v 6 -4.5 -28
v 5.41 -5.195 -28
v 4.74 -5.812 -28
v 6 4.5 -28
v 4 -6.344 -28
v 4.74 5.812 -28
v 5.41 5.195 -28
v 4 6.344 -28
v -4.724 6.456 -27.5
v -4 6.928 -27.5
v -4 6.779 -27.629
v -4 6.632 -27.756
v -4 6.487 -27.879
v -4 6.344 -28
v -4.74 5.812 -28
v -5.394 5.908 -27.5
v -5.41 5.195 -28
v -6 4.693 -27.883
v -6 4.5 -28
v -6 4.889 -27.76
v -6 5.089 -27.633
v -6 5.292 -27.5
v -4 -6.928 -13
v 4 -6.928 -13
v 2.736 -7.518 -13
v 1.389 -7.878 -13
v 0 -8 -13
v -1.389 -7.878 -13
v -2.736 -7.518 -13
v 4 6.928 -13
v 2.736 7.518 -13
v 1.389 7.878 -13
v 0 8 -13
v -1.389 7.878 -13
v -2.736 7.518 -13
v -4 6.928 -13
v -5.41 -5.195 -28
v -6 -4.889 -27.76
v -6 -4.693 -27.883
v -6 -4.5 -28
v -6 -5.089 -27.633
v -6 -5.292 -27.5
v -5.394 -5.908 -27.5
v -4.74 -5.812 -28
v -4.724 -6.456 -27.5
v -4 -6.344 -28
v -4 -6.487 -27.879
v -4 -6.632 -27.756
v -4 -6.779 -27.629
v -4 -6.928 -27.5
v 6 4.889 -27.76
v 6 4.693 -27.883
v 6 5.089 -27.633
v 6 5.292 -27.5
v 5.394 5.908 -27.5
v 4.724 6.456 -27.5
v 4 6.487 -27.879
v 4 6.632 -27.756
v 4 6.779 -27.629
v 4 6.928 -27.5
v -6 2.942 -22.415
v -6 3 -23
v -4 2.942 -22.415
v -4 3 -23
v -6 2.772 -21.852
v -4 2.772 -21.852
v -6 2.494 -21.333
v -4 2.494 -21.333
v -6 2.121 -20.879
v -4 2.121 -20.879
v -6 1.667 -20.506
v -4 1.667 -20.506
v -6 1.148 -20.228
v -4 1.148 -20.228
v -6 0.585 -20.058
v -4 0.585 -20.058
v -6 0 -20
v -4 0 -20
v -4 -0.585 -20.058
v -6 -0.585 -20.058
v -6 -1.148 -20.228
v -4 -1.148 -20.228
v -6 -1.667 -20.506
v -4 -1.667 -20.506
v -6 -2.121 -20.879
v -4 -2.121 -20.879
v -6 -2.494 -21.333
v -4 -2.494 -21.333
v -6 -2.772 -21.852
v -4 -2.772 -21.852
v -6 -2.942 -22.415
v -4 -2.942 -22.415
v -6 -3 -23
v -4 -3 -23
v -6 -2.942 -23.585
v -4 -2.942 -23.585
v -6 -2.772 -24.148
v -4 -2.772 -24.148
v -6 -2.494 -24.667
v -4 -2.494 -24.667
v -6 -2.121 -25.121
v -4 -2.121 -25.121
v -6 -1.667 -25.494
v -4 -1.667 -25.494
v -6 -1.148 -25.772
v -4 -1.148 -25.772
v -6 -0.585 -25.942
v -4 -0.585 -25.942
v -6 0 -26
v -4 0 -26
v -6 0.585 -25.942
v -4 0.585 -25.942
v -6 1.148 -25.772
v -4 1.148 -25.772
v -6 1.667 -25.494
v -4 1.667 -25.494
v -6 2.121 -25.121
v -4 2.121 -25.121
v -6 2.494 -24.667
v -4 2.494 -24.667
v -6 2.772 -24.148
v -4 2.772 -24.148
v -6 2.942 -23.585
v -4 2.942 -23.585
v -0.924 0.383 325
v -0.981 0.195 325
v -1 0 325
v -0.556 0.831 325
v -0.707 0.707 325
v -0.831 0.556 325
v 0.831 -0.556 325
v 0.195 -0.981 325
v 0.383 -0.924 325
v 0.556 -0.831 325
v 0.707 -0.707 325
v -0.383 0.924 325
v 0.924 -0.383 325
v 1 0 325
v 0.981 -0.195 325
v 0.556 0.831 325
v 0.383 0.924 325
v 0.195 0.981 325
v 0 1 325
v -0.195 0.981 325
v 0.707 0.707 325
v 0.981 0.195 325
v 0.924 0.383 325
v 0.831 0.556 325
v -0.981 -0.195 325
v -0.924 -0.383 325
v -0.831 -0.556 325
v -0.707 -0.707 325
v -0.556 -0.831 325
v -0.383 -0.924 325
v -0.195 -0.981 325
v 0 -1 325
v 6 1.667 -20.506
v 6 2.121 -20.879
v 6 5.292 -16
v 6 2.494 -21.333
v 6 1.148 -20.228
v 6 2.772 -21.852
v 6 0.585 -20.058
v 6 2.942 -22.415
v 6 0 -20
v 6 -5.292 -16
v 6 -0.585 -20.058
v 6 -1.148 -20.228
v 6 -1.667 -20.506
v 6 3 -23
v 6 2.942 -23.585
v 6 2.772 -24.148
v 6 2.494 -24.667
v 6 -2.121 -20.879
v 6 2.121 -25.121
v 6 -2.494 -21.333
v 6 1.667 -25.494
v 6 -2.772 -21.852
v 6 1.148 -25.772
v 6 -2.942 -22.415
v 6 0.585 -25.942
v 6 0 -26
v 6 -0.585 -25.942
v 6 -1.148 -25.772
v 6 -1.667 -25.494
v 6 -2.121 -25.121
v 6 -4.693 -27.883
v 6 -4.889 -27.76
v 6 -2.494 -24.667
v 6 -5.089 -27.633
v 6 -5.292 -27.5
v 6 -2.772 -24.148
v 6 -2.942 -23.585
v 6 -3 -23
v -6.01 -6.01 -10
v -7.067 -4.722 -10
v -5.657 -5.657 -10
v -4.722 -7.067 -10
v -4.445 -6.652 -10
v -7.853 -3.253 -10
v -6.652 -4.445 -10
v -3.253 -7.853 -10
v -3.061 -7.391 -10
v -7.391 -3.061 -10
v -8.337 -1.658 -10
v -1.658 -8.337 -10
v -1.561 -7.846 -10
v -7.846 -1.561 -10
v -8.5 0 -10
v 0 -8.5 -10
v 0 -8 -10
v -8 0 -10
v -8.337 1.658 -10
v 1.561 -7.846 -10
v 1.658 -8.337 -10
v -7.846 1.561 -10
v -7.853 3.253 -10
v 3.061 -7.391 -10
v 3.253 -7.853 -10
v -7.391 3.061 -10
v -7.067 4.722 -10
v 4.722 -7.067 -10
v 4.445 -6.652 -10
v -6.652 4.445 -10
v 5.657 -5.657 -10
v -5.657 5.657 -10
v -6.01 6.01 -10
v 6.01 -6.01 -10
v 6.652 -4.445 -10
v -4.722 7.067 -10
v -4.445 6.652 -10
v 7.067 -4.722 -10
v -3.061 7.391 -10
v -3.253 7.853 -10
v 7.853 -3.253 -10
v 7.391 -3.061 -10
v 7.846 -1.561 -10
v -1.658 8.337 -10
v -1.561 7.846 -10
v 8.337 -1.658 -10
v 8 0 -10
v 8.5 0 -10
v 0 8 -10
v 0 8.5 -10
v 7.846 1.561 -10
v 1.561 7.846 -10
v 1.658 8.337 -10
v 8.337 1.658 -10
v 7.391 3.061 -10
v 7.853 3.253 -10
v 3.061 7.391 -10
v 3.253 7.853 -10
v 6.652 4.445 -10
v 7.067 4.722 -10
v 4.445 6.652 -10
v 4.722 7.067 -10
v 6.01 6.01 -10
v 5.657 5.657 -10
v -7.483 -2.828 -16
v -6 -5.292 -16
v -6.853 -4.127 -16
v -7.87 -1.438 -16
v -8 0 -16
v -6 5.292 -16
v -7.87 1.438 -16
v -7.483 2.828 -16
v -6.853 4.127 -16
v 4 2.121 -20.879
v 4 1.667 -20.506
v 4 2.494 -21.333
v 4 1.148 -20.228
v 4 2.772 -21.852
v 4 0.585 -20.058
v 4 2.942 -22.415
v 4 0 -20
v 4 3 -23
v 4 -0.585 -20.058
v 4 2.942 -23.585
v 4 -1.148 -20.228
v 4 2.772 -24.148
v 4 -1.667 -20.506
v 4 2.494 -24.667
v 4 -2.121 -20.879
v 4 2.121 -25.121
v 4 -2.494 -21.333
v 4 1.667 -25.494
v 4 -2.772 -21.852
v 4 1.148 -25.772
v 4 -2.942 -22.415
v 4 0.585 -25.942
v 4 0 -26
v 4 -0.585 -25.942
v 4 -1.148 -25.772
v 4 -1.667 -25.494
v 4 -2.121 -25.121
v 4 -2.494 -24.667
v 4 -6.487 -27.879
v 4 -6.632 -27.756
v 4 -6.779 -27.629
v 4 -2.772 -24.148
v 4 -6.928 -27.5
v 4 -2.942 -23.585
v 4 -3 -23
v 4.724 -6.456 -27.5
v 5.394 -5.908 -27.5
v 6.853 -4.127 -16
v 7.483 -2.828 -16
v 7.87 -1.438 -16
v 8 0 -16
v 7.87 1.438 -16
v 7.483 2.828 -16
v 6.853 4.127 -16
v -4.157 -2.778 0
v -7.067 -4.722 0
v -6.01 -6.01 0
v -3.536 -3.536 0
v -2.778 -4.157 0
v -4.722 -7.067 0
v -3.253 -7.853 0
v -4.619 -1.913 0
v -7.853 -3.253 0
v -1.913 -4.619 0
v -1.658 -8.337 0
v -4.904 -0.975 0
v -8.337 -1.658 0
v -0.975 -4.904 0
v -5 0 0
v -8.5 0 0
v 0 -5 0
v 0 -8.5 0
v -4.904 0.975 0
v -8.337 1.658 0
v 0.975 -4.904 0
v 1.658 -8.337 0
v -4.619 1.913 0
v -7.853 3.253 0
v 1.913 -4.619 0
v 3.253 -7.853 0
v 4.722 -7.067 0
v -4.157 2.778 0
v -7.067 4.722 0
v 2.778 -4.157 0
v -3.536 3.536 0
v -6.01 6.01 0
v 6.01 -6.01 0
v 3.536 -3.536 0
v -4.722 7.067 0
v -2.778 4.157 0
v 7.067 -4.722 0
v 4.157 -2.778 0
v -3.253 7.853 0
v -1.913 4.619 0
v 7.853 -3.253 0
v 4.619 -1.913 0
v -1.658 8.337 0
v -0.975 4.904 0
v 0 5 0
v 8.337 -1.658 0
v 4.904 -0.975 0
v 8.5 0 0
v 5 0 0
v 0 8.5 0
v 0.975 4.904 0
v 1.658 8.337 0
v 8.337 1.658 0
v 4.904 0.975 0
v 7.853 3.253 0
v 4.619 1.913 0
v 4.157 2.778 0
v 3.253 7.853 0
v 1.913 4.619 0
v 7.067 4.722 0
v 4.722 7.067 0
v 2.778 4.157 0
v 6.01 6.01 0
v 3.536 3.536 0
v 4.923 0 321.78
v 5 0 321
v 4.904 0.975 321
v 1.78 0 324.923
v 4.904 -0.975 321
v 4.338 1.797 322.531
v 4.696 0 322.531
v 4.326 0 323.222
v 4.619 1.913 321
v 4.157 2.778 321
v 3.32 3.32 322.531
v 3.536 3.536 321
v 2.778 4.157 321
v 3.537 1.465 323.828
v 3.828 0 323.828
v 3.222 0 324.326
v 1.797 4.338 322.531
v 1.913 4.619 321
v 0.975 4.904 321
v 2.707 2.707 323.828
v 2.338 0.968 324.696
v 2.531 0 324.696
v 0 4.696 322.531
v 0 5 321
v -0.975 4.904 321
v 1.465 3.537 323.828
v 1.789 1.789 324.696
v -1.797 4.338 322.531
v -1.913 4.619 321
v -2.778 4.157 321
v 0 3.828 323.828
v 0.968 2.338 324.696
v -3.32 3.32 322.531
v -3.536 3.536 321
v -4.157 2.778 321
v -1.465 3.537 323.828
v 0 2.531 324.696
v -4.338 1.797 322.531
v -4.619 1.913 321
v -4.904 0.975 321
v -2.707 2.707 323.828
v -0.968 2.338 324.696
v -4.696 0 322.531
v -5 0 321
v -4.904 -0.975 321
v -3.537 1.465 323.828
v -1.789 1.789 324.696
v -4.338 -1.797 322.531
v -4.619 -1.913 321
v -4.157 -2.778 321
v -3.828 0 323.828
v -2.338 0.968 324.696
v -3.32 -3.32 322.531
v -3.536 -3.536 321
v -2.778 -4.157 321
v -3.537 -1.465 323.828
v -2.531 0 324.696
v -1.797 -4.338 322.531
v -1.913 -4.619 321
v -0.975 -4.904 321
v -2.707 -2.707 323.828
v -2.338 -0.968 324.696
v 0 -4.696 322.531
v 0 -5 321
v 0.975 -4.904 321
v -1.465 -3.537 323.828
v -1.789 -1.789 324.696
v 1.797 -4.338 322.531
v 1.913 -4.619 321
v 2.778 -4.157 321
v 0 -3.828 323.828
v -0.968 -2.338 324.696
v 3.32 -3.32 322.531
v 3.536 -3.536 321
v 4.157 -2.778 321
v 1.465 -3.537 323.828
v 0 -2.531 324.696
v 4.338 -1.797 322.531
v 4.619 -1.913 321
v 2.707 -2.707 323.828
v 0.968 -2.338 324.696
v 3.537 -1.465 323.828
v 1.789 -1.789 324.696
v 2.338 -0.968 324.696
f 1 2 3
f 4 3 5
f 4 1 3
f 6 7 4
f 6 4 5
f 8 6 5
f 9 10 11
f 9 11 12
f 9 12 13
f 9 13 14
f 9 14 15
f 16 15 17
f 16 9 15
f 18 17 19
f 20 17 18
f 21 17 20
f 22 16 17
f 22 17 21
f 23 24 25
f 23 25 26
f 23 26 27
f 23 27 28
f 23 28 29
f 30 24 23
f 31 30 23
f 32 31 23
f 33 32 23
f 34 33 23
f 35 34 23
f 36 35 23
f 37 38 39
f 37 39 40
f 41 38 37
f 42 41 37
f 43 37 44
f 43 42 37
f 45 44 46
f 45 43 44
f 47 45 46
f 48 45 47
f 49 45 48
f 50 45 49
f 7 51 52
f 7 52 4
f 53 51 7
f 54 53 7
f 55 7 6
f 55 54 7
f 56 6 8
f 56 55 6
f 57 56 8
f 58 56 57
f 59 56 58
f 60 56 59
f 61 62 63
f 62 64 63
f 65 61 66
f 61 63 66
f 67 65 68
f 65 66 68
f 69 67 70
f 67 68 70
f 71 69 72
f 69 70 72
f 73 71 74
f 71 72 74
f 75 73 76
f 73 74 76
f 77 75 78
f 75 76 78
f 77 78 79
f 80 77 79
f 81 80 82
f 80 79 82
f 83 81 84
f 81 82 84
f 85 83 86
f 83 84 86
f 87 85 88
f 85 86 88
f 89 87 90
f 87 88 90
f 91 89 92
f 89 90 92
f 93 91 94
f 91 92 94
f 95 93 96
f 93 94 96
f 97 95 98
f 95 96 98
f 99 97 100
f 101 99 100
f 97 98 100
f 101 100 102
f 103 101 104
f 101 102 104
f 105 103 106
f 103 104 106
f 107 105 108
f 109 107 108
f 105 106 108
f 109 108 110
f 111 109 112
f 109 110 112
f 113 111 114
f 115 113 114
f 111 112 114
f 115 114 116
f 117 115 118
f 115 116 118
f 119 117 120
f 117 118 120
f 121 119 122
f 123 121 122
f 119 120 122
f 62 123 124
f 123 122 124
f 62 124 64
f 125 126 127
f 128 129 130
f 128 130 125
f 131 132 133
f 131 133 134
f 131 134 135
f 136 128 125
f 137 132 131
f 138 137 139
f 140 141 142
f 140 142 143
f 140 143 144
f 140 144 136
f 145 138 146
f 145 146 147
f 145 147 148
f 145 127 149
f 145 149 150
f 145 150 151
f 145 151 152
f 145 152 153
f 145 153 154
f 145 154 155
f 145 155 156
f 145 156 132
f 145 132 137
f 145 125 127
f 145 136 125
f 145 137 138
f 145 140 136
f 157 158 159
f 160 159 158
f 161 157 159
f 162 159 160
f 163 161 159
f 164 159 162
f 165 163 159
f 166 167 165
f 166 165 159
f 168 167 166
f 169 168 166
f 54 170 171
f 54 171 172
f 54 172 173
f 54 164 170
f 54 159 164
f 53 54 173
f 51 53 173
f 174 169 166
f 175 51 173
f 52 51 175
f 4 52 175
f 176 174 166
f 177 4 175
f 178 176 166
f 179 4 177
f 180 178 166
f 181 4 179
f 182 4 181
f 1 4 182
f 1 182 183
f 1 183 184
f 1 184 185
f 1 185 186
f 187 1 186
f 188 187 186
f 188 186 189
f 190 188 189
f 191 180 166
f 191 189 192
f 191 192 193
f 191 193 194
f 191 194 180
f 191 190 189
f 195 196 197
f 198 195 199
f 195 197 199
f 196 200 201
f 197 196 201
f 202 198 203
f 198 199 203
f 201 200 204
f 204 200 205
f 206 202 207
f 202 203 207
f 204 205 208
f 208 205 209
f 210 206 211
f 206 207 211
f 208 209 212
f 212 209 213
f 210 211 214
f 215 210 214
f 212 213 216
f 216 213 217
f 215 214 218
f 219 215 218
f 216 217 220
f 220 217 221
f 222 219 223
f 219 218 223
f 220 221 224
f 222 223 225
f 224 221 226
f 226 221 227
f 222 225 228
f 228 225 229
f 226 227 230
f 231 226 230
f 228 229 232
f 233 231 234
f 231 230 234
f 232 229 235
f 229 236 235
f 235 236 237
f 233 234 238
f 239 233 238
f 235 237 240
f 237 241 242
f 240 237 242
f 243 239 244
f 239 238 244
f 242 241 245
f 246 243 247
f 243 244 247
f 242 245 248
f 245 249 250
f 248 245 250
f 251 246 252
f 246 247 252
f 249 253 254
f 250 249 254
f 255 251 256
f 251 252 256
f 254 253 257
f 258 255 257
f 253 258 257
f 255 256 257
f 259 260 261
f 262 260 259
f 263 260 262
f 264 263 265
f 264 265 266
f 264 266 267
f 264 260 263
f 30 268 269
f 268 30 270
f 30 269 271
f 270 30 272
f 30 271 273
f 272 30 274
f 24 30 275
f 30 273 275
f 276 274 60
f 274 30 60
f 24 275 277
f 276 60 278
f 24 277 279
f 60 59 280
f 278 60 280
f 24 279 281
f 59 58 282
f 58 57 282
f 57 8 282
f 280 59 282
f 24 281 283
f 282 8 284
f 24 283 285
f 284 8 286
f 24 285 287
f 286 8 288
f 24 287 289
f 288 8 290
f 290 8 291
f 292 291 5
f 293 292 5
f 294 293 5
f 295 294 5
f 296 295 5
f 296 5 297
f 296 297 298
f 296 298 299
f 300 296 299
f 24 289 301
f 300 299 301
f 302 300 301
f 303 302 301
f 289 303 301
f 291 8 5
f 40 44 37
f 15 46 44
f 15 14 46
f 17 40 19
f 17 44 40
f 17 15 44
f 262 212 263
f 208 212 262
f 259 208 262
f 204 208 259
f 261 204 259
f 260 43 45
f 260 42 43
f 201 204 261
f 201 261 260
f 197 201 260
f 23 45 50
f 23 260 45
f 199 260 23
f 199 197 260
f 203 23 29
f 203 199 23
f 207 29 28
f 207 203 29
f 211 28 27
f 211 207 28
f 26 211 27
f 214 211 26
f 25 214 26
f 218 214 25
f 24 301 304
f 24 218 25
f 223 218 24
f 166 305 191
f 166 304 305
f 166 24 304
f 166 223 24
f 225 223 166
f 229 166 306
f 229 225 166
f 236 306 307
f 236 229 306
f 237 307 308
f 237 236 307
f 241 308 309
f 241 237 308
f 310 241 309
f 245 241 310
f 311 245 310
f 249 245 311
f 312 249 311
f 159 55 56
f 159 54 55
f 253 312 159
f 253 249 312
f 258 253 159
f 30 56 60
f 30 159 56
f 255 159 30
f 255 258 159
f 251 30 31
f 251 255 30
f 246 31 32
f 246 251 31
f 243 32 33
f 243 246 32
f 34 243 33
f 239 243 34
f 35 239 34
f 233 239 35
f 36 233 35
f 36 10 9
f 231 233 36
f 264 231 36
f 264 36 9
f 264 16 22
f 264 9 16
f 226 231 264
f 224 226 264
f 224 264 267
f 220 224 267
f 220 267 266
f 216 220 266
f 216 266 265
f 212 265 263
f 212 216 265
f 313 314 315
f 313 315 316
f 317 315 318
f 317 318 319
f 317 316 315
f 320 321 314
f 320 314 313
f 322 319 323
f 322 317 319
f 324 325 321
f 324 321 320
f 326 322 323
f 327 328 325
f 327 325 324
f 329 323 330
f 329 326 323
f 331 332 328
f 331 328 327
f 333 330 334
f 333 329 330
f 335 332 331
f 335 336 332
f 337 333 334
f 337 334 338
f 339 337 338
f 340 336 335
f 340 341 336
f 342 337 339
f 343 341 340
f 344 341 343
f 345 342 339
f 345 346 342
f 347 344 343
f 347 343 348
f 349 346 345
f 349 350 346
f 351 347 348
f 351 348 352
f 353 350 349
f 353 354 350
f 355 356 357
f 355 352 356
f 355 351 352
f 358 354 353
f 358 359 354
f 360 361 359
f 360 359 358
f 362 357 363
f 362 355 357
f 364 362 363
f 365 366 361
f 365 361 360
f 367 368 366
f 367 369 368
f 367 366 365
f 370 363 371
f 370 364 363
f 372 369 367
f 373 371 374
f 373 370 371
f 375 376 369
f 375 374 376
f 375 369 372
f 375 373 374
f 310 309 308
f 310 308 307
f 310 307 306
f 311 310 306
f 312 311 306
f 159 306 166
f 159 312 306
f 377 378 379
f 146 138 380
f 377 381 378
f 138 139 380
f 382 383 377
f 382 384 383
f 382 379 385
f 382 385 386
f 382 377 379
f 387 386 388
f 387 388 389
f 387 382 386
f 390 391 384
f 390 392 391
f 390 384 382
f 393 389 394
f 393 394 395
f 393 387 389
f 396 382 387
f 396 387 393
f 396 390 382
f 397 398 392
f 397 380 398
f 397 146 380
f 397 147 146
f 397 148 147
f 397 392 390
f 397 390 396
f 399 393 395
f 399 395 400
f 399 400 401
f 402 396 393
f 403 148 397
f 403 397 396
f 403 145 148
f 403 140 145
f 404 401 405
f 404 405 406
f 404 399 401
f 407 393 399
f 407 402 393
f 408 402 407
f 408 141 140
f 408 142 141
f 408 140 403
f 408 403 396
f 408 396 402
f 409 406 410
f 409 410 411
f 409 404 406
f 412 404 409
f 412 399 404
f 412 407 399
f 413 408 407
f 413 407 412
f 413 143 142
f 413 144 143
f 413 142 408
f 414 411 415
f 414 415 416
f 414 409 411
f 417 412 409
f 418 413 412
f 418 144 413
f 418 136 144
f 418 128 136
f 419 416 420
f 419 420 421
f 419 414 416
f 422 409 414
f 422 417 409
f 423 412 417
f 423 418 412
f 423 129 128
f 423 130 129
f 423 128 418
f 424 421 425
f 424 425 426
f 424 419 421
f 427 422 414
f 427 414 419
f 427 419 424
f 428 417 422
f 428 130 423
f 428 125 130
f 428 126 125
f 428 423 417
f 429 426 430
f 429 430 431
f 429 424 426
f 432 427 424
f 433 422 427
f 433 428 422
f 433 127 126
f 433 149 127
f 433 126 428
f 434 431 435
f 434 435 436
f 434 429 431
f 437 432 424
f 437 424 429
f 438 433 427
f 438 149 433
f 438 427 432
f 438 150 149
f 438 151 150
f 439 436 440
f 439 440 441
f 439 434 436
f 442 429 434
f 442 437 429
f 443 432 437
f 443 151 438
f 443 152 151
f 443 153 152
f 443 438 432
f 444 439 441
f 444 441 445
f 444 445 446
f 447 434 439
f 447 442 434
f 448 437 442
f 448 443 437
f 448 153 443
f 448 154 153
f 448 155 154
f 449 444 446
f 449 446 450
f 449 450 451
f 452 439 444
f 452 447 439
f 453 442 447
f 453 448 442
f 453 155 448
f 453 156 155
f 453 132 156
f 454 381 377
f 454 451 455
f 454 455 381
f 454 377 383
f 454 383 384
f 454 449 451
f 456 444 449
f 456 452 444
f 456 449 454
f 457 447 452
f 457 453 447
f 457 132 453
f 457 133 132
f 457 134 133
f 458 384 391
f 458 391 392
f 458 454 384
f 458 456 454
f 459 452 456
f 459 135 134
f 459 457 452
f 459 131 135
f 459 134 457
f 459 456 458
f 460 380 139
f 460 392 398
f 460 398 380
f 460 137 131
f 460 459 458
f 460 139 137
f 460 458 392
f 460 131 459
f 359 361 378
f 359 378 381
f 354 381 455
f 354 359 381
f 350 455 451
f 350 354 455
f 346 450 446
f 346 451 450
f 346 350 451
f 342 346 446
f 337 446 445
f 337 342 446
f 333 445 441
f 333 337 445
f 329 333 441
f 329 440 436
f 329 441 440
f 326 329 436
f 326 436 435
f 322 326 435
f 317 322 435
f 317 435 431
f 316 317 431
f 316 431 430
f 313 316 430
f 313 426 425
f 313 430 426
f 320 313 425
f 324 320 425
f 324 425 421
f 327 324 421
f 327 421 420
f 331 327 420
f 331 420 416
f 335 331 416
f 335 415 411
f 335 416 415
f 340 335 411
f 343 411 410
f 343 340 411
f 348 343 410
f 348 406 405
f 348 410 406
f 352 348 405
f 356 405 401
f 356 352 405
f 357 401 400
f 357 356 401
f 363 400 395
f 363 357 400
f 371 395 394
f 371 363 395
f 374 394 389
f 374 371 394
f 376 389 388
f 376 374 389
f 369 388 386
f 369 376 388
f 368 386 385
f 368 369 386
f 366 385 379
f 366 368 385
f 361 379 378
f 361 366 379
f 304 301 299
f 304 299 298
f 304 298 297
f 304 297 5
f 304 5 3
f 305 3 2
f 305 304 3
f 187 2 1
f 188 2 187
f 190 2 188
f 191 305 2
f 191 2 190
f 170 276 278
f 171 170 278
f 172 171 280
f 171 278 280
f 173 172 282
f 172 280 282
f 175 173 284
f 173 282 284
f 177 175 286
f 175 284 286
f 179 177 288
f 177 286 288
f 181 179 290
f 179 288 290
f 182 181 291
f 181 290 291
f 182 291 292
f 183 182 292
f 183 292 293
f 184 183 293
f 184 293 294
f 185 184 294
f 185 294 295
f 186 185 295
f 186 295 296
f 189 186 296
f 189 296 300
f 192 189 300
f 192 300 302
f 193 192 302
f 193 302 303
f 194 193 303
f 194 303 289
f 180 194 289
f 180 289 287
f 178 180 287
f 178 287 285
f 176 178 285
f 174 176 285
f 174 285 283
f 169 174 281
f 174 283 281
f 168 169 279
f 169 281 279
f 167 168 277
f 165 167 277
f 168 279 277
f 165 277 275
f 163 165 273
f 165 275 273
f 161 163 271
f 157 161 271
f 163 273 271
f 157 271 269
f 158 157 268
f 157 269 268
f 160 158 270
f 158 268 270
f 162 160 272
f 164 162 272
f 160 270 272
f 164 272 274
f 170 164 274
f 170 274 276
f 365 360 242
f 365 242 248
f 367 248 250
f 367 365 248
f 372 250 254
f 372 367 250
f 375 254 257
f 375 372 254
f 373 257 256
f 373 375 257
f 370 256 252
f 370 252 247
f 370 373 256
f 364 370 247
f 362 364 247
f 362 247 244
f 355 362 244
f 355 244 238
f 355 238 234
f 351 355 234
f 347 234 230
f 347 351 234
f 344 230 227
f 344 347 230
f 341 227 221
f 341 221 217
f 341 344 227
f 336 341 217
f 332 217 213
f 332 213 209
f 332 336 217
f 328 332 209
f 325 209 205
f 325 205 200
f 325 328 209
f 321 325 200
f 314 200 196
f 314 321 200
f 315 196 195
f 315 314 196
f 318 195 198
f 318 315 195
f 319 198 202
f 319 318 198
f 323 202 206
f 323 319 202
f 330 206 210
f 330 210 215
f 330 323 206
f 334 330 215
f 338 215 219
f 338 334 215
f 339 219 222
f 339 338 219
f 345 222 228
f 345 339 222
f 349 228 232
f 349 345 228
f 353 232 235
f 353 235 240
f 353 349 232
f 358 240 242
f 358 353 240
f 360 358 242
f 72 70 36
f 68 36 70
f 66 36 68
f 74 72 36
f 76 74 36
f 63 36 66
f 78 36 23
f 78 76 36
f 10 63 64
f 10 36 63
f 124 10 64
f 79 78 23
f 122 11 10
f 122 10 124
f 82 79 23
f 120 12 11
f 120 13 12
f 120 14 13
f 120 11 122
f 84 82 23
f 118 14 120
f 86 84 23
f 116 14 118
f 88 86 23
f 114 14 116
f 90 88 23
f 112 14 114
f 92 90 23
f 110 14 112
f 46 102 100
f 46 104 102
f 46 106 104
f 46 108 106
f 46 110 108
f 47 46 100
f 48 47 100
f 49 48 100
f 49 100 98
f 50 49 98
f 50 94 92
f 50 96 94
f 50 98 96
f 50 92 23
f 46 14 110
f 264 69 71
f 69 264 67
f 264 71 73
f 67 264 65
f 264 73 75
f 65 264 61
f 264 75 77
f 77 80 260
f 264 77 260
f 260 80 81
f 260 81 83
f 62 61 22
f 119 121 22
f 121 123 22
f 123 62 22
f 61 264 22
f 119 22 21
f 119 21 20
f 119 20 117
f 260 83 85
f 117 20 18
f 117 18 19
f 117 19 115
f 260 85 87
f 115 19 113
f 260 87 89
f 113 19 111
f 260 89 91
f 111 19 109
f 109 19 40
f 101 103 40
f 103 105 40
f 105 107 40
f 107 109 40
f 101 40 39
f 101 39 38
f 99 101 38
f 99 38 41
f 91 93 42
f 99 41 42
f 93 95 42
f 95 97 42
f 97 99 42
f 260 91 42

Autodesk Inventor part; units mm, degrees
ref_plane "YZ Plane" through (0, 0, 0) normal (1, 0, 0) x (0, 1, 0)
ref_plane "XZ Plane" through (0, 0, 0) normal (0, 1, 0) x (-1, 0, 0)
ref_plane "XY Plane" through (0, 0, 0) normal (0, 0, 1) x (1, 0, 0)
sketch "Esboço1" plane through (0, 0, 0) normal (0, 0, 1) x (1, 0, 0)
  circle A0 centre (0, 0) radius 8.5
  dimension "d0" = 17
extrude "Extrusão1" add sketch "Esboço1" against normal blind 10
sketch "Esboço2" plane through (0, 0, 0) normal (0, 0, 1) x (1, 0, 0)
  circle A0 centre (0, 0) radius 8.5 projected
  circle A1 centre (0, 0) radius 5
  dimension "d3" = 10
extrude "Extrusão2" add sketch "Esboço2" along normal blind 325 contours A1
sketch "Esboço3" plane through (0, 0, -10) normal (0, 0, -1) x (-1, 0, 0)
  circle A0 centre (0, 0) radius 8.5 projected
  circle A1 centre (0, 0) radius 8
  dimension "d6" = 16
extrude "Extrusão3" add sketch "Esboço3" along normal blind 18 contours A1
sketch "Esboço4" plane through (0, 0, -28) normal (0, 0, -1) x (-1, 0, 0)
  circle A0 centre (0, 0) radius 8 projected
  circle A1 centre (0, 0) radius 8 projected
  line L0 (-4, 6.9282) -> (-4, -6.9282)
  line L1 (4, 6.9282) -> (4, -6.9282)
  arc A2 (-4, -6.9282) -> (4, -6.9282) centre (0, 0) ccw
  arc A3 (4, 6.9282) -> (-4, 6.9282) centre (0, 0) ccw
  point P0 (-4, -6.9282)
  dimension "d9" = 4
  dimension "d10" = 4
extrude "Extrusão4" cut sketch "Esboço4" against normal blind 15 contours L1 A0 L0
sketch "Esboço6" plane through (0, 0, -28) normal (0, 0, -1) x (-1, 0, 0)
  line L0 (-4, -6.9282) -> (-4, 6.9282) projected
  arc A0 (-4, 6.9282) -> (-4, -6.9282) centre (0, 0) ccw projected
  circle A1 centre (0, 0) radius 8 projected
  line L1 (-6, 5.2915) -> (-6, -5.2915)
  line L2 (6, 5.2915) -> (6, -5.2915)
  arc A2 (-6, 5.2915) -> (-6, -5.2915) centre (0, 0) ccw
  arc A3 (6, -5.2915) -> (6, 5.2915) centre (0, 0) ccw
  point P0 (6, -5.2915)
  dimension "d15" = 6
  dimension "d16" = 6
extrude "Extrusão5" cut sketch "Esboço6" against normal blind 12 contours A0 L1 | L2 A1
sketch "Esboço7" plane through (0, 0, 0) normal (1, 0, 0) x (0, 1, 0)
  circle A0 centre (0, -23) radius 3
  line L0 (-6.9282, -28) -> (6.9282, -28) projected
  point P0 (0, 0)
  dimension "d19" = 5
  dimension "d20" = 6
extrude "Extrusão6" cut sketch "Esboço7" along normal through all both and the other way through all
chamfer "Chanfro1" distance 0.5 angle 45 4 edges at (-5.0665, -6.1911, -28) (-5.0665, 6.1911, -28) (5.0665, -6.1911, -28) (5.0665, 6.1911, -28)
fillet "Arredondamento1" radius 4 1 edges at (-5, 0, 325)
